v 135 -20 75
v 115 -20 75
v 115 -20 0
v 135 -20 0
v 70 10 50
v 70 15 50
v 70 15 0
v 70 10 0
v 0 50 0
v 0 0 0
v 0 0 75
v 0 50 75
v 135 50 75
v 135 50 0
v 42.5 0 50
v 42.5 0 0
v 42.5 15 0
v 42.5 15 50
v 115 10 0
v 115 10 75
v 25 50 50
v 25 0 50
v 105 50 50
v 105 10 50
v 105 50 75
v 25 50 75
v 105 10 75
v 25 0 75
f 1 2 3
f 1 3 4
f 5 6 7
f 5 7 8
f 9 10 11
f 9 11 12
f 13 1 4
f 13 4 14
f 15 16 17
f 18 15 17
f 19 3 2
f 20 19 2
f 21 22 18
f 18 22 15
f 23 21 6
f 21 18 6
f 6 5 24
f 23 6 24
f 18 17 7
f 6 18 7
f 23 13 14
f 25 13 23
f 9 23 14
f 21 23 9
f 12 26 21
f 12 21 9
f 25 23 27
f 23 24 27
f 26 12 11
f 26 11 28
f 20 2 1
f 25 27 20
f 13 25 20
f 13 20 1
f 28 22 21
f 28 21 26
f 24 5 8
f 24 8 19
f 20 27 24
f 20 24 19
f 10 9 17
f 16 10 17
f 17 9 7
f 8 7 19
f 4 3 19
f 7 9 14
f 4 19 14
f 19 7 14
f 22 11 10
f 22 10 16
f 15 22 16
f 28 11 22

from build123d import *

# Parameters (mm, degrees)
F0_W     = 25
F0_H     = 50
F1_DEPTH = 75
F3_DEPTH = 75
F5_DEPTH = 75
F6_W     = 80
F6_H     = 25
F7_DEPTH = 75
F8_W     = 10
F8_H     = 75
F9_DEPTH = 30


with BuildPart() as f1:
    # F0 (on Top) → F1 (new body)
    with BuildSketch(Plane.XY):
        with Locations((12.5, 25)):
            Rectangle(F0_W, F0_H)
    extrude(amount=F1_DEPTH)

    # F2 (on face) → F3 (join)
    with BuildSketch(Plane.XY.offset(75)):
        Polygon((25, 50), (25, 0), (42.5, 0), (42.5, 15), (70, 15), (70, 10), (105, 10), (105, 50), align=None)
    extrude(amount=-F3_DEPTH)

    # F4 (on face) → F5 (join)
    with BuildSketch(Plane.XY.offset(75)):
        Polygon((135, 50), (105, 50), (105, 10), (105, -20), (135, -20), align=None)
    extrude(amount=-F5_DEPTH)

    # F6 (on face) → F7 (cut)
    with BuildSketch(Plane.XZ.offset(20)):
        with Locations((65, 62.5)):
            Rectangle(F6_W, F6_H)
    extrude(amount=-F7_DEPTH, mode=Mode.SUBTRACT)

    # F8 (on face) → F9 (cut)
    with BuildSketch(Plane.XZ.offset(20)):
        with Locations((110, 37.5)):
            Rectangle(F8_W, F8_H)
    extrude(amount=-F9_DEPTH, mode=Mode.SUBTRACT)


solid = f1.part
